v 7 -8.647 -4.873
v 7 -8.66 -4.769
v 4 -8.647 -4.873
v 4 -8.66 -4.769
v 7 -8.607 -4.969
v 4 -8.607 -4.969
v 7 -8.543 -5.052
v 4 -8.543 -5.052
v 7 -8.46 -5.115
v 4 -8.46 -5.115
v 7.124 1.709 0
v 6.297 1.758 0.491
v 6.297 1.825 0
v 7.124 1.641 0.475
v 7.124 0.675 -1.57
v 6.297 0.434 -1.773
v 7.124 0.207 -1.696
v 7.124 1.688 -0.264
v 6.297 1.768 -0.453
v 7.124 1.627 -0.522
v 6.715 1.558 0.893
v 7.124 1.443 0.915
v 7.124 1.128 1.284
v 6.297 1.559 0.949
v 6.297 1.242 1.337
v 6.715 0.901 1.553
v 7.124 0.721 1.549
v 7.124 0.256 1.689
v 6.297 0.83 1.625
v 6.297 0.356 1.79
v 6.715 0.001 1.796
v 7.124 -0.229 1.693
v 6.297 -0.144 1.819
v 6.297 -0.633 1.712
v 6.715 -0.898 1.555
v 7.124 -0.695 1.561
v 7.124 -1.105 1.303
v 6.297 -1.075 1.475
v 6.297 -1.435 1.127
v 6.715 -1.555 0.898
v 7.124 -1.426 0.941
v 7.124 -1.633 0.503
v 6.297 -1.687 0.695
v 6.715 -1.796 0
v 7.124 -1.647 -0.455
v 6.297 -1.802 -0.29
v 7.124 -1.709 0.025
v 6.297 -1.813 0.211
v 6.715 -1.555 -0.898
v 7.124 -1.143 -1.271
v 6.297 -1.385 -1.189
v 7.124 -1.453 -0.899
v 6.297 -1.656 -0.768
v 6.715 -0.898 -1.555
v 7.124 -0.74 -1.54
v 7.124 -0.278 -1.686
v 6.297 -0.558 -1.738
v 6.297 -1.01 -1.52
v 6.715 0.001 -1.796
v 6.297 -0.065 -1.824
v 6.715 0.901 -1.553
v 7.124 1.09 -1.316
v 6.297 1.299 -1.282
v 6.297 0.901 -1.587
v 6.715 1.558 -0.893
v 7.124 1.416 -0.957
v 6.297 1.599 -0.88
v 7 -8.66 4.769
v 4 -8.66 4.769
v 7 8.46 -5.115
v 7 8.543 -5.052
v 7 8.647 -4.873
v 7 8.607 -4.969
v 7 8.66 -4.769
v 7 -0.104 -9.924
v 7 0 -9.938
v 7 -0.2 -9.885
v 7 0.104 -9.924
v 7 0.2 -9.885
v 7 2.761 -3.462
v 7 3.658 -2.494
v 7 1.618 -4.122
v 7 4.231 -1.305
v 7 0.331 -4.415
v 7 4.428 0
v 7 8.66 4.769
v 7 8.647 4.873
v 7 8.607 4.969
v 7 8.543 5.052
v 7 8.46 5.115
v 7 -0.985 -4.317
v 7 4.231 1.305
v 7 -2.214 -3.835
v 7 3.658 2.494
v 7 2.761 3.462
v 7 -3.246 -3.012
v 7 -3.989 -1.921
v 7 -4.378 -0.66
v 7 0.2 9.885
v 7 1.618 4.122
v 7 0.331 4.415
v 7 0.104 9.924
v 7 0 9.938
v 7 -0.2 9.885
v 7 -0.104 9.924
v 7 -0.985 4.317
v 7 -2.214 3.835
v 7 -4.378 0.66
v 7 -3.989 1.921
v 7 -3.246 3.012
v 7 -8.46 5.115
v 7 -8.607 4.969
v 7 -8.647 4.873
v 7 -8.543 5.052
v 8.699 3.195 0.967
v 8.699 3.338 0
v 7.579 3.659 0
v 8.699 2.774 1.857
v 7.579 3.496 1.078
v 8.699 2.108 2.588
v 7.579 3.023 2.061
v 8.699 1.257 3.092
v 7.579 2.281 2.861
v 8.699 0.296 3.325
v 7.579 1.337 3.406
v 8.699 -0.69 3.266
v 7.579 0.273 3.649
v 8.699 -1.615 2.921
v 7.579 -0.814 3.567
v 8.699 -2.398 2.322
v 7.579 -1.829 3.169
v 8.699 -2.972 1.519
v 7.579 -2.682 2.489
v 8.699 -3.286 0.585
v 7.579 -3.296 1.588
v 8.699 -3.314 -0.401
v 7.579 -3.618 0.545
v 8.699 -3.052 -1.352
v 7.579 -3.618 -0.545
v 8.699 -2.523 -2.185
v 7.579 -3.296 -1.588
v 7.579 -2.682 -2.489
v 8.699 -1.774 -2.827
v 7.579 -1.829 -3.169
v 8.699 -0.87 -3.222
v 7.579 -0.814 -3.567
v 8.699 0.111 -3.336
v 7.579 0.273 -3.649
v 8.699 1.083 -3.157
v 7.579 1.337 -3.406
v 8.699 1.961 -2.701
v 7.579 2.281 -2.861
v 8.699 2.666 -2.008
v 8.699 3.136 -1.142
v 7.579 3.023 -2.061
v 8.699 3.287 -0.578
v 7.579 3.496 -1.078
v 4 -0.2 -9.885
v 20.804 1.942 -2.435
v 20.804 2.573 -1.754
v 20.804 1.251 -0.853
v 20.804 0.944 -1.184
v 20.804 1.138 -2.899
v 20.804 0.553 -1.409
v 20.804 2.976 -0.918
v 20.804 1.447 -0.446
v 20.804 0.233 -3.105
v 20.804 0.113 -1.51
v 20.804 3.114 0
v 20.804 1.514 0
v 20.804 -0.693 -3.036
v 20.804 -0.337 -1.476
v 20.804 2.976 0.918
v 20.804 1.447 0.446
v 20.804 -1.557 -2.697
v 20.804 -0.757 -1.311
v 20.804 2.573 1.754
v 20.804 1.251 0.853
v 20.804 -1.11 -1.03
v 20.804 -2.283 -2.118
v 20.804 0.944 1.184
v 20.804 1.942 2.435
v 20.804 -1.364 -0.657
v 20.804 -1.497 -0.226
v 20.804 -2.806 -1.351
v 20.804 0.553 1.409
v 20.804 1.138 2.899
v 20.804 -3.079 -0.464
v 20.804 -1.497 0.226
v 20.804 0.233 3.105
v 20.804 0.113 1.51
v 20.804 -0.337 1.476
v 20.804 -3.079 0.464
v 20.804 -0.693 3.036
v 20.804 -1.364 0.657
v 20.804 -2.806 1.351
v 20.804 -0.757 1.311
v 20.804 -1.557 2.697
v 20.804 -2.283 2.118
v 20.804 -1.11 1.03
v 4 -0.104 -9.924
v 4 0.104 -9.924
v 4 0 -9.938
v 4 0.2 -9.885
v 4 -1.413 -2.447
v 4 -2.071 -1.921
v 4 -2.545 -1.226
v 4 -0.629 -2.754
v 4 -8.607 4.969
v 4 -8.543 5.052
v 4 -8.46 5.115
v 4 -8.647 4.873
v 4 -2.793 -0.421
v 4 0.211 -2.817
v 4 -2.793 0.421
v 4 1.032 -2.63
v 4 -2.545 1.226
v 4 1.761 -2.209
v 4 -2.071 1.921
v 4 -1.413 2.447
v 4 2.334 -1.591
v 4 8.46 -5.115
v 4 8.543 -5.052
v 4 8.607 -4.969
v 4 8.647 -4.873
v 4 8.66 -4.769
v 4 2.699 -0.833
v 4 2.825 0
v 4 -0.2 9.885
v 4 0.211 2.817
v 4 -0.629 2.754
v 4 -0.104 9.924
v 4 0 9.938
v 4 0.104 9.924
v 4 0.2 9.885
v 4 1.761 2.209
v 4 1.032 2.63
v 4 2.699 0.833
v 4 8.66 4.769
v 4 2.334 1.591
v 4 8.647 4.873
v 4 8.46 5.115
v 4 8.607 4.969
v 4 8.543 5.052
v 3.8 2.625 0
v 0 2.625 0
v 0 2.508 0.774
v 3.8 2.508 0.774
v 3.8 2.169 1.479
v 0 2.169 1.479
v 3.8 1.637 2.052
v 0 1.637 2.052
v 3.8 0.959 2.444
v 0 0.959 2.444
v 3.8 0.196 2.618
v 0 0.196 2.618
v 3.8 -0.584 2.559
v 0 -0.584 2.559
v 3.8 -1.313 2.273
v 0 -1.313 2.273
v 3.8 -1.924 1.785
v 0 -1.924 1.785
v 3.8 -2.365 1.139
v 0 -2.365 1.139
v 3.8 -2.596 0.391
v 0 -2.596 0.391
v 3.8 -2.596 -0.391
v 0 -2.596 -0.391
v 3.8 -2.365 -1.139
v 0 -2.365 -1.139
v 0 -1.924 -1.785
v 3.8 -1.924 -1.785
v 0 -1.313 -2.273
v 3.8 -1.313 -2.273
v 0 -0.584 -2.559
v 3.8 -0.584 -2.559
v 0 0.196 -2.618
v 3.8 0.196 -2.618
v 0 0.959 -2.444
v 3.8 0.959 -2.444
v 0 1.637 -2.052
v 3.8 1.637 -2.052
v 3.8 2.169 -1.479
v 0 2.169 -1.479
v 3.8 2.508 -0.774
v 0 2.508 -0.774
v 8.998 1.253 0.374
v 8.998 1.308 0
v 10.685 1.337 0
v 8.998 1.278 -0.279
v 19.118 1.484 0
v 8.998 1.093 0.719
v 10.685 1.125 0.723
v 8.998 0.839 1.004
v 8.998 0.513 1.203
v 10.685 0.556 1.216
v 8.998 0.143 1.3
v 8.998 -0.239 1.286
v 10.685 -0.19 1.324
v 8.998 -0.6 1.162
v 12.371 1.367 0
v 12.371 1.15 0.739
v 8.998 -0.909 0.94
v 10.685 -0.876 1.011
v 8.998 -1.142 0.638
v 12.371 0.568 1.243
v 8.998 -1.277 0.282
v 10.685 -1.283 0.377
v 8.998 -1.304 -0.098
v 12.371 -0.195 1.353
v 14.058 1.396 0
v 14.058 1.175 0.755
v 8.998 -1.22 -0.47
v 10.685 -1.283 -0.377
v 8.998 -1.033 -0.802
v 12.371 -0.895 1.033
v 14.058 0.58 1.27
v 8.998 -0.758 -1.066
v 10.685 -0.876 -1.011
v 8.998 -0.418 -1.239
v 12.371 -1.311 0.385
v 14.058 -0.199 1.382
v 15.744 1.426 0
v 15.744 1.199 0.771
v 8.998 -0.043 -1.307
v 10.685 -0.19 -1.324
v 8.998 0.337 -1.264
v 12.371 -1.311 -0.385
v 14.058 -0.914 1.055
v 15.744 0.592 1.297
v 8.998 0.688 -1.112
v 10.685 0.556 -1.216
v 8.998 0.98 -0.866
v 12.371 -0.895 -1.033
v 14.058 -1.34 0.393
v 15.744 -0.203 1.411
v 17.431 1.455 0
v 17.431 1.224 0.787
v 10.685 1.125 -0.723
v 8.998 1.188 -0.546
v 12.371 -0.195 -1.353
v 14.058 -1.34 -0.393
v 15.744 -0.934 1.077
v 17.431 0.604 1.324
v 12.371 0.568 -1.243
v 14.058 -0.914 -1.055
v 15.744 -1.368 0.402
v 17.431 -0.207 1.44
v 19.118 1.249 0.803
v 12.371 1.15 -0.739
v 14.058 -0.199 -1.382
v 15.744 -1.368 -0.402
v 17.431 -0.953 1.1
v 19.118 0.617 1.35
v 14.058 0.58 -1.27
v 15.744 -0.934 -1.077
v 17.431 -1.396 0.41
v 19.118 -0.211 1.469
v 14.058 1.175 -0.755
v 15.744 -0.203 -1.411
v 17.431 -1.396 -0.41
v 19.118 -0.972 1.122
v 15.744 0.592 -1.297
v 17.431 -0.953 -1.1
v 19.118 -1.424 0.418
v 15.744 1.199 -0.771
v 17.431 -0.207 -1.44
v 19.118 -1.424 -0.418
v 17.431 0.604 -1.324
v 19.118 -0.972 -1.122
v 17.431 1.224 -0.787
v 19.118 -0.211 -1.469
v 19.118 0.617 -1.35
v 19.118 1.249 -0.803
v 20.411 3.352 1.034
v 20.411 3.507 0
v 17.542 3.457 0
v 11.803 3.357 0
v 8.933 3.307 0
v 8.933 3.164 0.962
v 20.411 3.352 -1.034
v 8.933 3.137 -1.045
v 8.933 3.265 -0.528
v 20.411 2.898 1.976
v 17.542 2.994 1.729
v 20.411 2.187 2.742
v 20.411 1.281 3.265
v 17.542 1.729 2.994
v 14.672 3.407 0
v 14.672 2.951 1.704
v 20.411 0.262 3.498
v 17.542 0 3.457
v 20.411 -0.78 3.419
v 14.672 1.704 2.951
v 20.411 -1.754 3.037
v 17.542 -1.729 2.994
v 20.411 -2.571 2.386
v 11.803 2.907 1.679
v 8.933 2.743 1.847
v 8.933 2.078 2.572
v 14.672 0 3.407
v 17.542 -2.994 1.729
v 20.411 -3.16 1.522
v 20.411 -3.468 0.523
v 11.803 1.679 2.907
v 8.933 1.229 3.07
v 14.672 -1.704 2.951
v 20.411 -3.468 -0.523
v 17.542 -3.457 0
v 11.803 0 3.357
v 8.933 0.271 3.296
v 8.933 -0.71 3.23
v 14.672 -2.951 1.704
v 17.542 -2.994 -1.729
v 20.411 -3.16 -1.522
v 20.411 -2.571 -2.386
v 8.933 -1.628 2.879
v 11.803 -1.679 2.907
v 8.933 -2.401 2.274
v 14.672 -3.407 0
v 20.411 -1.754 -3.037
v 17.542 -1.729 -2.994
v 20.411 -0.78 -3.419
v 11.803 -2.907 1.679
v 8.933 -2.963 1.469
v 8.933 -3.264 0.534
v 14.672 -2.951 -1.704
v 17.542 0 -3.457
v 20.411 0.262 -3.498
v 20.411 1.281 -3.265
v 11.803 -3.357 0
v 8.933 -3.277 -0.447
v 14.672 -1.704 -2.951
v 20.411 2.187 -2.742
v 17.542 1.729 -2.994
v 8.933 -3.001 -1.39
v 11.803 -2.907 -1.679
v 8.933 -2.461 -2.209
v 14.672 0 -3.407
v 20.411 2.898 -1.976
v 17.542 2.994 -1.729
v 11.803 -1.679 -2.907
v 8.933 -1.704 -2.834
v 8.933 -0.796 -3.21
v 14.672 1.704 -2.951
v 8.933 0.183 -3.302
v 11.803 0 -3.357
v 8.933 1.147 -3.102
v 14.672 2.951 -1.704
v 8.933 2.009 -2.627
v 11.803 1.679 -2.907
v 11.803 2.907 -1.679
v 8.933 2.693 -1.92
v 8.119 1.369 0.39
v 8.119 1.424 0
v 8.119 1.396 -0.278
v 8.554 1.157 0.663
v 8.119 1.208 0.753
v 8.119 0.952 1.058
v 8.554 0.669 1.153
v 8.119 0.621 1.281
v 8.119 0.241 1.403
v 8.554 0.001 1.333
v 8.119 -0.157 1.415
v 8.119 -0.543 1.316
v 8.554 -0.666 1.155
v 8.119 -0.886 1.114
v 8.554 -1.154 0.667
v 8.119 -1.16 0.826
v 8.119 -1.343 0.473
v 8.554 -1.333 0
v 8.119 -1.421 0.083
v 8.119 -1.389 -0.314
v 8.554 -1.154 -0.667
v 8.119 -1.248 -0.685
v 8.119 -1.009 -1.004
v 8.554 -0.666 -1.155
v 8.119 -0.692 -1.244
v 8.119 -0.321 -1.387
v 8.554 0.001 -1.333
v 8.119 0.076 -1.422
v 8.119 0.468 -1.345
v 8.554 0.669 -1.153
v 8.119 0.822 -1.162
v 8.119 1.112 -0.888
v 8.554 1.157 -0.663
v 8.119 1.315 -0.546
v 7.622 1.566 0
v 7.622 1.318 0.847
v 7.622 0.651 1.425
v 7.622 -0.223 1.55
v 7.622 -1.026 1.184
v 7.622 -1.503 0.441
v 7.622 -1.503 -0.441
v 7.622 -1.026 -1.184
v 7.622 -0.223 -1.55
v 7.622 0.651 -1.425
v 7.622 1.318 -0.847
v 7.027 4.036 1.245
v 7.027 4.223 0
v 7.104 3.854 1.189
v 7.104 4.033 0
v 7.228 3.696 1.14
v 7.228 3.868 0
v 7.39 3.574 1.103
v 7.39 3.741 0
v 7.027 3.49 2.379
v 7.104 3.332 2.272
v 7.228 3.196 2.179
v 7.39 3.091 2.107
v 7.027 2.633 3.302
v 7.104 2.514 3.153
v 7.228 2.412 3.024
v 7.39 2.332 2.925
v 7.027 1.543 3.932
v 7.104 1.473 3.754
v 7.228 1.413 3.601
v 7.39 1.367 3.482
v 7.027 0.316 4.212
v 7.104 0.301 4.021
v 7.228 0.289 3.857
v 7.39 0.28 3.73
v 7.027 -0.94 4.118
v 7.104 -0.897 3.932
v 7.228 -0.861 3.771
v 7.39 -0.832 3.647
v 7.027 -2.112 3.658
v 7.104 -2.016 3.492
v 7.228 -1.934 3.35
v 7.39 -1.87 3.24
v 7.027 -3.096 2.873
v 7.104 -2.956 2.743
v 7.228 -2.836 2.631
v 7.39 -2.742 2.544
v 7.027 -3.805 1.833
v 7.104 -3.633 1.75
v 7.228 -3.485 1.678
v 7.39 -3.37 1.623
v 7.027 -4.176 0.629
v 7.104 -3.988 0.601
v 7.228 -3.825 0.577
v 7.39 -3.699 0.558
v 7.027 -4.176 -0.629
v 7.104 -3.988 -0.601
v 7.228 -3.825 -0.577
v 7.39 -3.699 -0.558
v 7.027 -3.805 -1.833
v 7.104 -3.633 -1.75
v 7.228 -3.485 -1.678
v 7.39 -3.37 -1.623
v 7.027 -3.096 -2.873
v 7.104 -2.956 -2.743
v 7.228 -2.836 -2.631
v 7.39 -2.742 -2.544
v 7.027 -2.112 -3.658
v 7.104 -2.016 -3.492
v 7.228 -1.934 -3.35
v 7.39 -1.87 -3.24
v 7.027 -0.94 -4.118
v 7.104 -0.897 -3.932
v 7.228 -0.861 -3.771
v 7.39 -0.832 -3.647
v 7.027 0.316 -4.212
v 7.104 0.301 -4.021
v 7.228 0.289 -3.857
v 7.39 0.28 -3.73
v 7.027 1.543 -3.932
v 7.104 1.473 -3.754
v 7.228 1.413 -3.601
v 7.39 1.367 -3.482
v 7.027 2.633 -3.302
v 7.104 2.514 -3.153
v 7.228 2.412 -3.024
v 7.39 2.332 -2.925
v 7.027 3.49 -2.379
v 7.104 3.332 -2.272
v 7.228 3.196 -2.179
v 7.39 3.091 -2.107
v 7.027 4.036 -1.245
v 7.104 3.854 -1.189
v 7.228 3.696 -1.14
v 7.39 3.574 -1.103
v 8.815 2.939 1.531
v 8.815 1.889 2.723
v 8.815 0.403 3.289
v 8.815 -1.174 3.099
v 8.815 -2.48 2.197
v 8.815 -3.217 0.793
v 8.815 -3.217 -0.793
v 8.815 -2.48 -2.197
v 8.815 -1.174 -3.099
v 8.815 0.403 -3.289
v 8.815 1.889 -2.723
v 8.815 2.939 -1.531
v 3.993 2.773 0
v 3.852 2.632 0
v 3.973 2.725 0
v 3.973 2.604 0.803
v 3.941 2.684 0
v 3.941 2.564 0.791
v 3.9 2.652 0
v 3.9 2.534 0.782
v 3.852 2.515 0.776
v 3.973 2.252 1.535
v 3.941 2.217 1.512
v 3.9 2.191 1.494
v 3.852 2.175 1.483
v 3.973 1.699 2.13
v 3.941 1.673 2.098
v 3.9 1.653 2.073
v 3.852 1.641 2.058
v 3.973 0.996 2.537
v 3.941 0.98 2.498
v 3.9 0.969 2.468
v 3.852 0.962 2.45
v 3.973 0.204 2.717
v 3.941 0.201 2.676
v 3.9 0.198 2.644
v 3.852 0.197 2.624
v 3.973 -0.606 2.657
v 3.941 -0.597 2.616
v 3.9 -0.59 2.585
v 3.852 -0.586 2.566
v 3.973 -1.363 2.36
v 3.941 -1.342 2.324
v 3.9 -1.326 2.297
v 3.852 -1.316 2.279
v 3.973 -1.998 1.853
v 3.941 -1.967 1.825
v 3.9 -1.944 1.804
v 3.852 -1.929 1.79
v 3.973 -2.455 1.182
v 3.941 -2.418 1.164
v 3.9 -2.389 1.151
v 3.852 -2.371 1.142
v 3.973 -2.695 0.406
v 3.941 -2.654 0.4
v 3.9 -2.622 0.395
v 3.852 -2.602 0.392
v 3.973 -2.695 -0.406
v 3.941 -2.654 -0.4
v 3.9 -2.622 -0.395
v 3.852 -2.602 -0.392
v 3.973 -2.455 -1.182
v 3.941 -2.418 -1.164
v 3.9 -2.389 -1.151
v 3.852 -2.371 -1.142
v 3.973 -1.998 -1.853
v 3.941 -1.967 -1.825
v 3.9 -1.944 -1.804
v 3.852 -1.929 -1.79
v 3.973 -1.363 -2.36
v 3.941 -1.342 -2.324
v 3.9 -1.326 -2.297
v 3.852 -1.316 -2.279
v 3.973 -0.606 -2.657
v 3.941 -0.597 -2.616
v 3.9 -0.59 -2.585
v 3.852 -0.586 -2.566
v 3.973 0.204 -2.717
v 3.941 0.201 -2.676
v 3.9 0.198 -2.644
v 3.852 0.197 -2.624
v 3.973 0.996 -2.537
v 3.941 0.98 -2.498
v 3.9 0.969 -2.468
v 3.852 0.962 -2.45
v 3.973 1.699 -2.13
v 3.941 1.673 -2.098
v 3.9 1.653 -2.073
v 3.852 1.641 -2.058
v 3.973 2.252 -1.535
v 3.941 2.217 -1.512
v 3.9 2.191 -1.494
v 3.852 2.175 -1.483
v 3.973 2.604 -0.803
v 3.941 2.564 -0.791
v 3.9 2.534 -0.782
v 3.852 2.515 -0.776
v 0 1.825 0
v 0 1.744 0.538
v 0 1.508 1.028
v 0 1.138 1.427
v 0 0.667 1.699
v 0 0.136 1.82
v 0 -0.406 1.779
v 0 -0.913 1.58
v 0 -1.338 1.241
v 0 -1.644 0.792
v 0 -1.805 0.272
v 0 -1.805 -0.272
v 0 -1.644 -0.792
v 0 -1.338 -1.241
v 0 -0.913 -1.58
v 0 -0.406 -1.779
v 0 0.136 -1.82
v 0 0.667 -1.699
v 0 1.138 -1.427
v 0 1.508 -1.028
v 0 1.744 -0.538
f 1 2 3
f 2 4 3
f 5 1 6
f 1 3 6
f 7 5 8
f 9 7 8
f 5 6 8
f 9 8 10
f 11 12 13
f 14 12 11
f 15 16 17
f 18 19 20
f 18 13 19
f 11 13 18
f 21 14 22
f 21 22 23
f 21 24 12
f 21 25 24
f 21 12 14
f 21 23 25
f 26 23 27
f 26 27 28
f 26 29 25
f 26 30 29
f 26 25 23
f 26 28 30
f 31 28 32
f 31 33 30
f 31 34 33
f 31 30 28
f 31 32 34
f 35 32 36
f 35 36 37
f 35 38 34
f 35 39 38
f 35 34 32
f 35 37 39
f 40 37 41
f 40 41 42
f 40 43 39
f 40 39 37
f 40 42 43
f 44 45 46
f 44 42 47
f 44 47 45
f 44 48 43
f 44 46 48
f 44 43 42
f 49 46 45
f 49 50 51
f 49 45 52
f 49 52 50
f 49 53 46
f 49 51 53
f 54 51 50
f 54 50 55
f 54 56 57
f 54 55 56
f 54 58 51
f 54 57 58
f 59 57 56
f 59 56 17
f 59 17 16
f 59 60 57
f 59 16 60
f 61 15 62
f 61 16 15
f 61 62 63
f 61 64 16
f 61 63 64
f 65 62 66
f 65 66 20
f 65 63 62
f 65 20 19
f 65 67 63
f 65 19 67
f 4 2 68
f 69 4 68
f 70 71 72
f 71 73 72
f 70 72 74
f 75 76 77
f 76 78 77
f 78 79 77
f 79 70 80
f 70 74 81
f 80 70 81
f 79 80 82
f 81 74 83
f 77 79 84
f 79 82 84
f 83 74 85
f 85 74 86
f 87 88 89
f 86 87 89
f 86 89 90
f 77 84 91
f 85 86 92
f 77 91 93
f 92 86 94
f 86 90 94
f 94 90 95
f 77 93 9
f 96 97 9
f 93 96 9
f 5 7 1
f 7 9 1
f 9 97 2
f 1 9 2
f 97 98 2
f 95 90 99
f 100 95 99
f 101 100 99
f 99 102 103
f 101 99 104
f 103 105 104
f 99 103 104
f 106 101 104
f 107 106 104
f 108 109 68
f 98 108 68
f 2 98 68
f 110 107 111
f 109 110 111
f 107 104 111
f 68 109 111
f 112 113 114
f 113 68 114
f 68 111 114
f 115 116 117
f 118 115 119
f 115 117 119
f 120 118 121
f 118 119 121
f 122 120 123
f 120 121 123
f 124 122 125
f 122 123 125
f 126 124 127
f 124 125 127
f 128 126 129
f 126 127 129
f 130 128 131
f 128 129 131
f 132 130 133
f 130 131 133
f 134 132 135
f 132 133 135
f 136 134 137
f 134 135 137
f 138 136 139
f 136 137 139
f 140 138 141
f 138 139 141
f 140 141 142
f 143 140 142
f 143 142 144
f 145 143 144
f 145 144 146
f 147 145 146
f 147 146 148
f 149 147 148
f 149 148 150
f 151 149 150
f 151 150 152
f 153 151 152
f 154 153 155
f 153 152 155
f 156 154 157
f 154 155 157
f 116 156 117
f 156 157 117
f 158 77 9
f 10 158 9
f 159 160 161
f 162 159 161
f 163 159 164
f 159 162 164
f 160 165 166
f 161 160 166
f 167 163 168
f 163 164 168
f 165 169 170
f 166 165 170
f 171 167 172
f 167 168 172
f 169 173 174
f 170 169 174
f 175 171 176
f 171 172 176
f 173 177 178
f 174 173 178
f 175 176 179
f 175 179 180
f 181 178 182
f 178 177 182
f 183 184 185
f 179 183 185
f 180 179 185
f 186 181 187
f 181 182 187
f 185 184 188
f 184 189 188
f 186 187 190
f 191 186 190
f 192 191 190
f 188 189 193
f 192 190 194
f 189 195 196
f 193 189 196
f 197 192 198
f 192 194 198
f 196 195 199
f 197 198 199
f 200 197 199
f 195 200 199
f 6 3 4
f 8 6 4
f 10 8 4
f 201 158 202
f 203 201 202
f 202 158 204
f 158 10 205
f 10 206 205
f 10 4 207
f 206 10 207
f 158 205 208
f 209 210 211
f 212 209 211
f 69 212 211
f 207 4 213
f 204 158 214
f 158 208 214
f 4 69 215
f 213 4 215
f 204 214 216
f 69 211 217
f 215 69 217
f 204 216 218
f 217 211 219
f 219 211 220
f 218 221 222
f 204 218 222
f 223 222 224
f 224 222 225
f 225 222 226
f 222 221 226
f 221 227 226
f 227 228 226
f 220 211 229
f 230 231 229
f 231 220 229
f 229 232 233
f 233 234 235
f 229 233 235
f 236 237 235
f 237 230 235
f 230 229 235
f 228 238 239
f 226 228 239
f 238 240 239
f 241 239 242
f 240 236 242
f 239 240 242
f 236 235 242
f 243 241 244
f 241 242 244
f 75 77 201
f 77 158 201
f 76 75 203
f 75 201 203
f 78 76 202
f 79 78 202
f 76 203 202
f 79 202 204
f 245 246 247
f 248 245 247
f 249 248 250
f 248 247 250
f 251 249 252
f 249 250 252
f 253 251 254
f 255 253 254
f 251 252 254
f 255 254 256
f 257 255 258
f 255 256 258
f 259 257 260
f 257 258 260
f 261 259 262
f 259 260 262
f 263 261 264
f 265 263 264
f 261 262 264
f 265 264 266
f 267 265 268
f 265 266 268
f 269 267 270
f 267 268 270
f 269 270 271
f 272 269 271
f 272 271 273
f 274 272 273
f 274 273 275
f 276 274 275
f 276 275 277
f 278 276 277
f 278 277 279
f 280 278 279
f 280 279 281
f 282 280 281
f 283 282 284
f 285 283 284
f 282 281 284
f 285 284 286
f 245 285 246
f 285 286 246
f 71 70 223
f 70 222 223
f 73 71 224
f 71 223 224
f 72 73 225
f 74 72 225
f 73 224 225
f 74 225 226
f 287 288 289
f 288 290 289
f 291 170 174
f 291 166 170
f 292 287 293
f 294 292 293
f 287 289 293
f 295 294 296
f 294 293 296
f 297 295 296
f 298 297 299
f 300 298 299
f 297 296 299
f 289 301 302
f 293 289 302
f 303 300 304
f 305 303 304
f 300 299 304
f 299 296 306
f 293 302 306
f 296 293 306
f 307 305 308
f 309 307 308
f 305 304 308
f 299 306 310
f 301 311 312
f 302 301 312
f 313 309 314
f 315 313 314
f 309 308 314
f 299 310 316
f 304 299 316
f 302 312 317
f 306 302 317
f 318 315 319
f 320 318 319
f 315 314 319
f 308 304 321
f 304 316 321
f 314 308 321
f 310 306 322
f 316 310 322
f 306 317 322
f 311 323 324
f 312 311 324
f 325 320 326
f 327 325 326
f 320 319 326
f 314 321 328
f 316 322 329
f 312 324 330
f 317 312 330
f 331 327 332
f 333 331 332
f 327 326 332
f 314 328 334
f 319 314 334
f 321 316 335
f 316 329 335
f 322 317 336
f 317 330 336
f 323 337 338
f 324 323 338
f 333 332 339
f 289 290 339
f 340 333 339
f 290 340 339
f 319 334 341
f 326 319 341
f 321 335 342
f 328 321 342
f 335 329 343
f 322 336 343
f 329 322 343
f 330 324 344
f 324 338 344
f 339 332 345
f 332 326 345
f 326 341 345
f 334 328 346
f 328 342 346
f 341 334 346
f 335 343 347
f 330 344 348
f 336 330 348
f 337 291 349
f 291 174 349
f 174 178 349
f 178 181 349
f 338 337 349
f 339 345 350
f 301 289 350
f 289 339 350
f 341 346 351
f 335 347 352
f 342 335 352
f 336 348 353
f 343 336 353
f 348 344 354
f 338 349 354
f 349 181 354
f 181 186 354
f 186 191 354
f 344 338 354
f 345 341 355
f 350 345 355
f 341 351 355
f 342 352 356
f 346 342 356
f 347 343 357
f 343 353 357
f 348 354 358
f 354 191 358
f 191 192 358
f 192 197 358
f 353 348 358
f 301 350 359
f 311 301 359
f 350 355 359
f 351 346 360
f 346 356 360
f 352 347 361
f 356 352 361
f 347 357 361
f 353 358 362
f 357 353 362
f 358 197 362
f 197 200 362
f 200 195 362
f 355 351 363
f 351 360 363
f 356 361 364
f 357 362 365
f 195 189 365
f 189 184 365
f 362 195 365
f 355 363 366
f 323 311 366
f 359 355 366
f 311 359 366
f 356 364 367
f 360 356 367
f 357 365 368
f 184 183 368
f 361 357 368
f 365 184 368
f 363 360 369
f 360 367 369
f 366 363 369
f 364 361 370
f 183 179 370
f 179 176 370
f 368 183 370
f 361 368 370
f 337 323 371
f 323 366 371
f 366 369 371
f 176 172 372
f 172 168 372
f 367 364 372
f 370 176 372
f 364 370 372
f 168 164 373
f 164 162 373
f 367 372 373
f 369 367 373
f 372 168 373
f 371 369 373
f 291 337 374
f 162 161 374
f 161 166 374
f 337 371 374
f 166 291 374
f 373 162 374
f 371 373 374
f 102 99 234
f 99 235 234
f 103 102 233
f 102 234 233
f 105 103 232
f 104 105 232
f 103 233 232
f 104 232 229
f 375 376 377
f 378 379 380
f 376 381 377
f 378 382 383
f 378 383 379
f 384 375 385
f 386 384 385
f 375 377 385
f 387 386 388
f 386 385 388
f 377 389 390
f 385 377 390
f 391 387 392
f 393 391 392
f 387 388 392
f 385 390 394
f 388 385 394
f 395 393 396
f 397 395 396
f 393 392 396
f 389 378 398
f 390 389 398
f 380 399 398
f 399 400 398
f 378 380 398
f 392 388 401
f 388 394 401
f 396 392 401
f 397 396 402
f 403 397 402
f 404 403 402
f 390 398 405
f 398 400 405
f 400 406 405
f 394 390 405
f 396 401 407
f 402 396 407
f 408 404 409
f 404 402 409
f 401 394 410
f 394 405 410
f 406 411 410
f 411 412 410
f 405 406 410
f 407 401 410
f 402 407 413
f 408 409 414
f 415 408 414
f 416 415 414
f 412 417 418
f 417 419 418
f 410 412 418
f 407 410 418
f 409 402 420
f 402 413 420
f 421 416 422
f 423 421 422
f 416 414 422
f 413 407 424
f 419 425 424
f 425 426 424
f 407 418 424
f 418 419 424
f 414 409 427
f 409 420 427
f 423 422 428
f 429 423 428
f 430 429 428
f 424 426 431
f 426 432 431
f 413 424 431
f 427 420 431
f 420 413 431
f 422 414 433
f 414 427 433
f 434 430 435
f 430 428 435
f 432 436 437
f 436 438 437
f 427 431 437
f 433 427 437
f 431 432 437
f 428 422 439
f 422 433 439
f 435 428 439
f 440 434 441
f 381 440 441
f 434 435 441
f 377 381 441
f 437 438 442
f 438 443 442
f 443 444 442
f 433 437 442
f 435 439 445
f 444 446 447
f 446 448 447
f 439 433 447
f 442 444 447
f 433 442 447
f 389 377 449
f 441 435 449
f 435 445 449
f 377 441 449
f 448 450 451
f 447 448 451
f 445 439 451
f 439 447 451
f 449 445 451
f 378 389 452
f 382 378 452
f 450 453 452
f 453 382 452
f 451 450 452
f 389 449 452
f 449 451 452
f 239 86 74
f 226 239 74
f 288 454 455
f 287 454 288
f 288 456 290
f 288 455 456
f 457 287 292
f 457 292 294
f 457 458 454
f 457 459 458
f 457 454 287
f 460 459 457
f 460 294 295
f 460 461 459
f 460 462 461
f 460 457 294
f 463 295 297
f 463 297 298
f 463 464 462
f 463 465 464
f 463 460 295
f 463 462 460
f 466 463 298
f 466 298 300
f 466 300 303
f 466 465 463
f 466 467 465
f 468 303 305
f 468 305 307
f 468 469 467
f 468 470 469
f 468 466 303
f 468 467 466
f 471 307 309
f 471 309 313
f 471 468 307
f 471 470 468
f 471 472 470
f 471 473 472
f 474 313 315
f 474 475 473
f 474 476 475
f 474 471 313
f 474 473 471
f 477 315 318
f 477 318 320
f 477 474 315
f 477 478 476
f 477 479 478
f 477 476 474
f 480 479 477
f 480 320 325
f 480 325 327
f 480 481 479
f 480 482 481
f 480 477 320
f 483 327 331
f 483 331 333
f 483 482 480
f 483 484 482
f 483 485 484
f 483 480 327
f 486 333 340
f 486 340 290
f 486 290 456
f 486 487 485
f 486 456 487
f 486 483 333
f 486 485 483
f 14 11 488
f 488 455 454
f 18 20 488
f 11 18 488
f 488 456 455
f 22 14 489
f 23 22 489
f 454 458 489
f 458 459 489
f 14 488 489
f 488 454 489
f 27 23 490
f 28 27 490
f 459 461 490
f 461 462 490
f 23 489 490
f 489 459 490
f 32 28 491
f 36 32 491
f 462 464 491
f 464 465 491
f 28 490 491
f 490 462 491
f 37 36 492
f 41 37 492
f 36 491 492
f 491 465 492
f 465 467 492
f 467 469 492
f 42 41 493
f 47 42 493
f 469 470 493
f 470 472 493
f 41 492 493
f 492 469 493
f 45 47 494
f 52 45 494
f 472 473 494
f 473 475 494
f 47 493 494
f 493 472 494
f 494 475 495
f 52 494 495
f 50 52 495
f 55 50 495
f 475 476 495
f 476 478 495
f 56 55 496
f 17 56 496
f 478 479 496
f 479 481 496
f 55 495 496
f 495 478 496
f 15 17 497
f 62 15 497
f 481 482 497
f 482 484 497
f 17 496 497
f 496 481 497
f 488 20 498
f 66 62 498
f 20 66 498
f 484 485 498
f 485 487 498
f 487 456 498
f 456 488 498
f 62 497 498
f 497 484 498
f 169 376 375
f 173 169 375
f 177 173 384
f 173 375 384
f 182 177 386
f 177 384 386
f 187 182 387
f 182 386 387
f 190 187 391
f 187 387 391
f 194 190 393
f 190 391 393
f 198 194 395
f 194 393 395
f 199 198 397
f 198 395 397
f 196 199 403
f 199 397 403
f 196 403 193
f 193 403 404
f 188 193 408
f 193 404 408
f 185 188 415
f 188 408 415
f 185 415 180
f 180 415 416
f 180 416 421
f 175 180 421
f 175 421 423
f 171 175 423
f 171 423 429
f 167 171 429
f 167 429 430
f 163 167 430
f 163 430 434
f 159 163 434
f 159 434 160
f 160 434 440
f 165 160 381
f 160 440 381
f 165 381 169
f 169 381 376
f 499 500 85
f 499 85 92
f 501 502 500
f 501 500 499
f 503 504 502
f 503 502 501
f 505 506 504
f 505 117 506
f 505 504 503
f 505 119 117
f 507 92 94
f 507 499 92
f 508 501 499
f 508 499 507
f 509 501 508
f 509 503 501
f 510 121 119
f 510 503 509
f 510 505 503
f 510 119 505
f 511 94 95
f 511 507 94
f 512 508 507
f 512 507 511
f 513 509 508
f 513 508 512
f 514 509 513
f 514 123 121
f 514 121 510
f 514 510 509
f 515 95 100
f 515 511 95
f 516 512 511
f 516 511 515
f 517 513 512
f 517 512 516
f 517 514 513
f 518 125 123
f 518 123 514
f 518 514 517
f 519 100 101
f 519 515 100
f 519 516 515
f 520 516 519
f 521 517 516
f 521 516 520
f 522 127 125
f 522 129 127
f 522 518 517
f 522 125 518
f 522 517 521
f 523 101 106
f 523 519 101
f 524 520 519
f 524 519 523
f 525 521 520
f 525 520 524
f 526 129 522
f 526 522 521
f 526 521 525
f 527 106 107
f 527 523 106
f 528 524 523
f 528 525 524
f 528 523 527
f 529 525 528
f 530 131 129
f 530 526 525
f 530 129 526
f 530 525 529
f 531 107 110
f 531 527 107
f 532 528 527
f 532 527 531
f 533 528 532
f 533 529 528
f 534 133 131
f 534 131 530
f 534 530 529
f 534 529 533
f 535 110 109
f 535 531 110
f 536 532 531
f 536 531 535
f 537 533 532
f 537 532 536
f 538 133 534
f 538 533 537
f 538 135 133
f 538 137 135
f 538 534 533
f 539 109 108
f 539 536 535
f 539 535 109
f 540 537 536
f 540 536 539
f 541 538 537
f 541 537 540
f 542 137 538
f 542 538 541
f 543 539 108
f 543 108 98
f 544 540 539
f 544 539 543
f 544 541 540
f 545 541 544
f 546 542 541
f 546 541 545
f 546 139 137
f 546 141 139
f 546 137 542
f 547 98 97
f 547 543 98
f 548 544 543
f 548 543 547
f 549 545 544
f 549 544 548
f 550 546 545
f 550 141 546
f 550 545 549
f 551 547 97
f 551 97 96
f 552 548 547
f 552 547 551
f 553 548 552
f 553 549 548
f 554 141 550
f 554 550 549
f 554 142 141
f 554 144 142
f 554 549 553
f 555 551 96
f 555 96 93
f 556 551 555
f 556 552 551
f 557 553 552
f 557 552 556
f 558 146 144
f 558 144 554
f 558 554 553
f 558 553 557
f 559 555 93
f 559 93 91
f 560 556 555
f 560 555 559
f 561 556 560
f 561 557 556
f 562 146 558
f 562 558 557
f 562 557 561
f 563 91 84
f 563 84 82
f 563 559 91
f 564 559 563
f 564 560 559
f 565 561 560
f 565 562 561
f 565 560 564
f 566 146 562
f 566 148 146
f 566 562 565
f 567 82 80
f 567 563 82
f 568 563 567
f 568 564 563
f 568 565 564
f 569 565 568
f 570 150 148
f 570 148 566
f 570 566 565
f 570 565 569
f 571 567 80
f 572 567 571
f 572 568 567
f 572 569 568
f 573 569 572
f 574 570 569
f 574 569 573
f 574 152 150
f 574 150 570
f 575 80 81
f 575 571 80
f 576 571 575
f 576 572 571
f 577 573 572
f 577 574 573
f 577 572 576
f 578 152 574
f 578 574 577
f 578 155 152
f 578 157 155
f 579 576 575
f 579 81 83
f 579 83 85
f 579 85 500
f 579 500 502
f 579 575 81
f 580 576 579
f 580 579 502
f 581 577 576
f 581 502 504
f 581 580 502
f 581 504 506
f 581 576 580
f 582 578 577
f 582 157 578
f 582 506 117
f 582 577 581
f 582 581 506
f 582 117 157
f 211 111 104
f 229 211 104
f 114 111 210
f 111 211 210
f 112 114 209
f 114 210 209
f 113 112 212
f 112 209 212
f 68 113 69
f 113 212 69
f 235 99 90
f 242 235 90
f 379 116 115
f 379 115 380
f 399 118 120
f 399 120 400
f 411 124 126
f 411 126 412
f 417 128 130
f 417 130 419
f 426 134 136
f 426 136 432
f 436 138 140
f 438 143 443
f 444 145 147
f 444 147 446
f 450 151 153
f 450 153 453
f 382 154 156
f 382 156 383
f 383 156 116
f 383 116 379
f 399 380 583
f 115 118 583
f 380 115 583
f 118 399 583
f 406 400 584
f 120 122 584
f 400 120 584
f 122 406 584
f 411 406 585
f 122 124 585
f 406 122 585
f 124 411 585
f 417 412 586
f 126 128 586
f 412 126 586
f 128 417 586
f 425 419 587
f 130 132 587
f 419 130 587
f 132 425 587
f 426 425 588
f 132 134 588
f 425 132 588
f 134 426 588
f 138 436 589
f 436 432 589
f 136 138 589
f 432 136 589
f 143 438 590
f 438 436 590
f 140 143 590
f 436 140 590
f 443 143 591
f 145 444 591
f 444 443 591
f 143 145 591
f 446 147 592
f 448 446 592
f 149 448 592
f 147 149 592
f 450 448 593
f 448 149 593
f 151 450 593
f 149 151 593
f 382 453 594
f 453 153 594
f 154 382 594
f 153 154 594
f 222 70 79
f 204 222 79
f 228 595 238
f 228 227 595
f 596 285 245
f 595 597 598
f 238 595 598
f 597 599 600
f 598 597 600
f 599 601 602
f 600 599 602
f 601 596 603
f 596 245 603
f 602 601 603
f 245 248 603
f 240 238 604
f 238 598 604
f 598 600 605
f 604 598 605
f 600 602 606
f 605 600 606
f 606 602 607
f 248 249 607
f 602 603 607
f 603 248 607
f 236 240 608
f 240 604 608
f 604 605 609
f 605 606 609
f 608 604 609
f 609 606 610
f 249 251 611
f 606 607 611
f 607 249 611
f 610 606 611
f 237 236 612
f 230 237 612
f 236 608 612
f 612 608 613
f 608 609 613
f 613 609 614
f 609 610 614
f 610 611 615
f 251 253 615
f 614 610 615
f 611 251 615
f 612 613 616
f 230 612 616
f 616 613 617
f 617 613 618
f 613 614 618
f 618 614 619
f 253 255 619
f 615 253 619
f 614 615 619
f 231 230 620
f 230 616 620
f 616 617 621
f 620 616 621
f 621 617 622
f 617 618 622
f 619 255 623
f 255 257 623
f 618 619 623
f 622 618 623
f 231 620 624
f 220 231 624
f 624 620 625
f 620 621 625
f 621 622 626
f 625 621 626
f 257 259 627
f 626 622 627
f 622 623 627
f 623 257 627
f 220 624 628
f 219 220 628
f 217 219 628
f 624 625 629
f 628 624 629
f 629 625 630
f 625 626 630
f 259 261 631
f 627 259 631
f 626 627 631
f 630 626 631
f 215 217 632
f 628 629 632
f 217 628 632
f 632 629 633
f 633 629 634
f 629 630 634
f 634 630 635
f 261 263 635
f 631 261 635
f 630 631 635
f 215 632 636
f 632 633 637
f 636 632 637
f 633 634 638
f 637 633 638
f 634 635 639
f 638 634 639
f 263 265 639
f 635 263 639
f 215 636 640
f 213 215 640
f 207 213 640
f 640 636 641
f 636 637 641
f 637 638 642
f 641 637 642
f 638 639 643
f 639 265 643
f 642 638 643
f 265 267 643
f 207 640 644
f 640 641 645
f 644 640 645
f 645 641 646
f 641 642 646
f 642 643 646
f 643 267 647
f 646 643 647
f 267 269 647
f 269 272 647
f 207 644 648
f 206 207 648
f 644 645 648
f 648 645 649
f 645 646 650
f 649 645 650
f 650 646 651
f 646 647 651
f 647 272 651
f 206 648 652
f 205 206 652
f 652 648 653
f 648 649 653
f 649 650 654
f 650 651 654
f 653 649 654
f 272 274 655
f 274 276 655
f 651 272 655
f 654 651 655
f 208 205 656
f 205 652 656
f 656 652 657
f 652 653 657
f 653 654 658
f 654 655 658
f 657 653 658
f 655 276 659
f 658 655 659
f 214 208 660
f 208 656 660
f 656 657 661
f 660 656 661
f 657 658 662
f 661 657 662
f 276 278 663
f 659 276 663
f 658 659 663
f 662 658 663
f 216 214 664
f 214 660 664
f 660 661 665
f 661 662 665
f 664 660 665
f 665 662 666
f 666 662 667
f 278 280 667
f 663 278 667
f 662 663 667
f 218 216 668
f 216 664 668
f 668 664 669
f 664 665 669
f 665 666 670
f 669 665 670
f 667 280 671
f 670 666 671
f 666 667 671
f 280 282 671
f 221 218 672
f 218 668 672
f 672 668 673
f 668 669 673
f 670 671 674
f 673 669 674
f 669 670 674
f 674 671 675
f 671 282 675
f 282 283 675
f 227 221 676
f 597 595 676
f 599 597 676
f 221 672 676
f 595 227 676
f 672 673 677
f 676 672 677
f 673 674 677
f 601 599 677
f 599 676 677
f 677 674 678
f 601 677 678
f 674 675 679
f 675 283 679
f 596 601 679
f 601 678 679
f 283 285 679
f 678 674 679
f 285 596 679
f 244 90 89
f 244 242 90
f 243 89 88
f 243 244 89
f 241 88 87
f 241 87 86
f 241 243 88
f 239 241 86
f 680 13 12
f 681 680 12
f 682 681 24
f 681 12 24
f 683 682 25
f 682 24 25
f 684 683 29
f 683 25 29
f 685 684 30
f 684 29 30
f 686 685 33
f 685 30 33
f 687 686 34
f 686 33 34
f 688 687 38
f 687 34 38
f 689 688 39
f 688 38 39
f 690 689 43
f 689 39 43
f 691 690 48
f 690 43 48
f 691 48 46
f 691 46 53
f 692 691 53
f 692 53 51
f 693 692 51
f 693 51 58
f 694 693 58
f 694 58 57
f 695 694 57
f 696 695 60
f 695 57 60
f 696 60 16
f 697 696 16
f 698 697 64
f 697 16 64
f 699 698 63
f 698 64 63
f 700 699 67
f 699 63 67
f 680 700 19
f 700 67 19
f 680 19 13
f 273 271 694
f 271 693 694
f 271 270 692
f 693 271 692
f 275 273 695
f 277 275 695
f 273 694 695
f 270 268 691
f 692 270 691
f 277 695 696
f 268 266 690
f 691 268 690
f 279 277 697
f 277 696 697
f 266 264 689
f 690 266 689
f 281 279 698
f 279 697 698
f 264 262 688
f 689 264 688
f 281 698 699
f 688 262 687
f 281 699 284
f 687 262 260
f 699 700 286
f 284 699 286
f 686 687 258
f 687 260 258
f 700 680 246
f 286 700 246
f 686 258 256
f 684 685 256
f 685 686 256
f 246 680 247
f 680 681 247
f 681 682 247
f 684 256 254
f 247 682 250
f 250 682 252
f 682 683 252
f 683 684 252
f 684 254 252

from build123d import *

# Parameters (mm, degrees)
FILLET4_R               = 3
CHAMFER1_SIZE2          = 0.393197641
CHAMFER1_SIZE           = 0.4
CUT_EXTRUDE1_DEPTH      = 14.804133806
CUT_EXTRUDE1_DEPTH_BACK = 8.0000001
FILLET5_R               = 0.4
FILLET6_R               = 0.8
FILLET7_R               = 0.2


with BuildPart() as part:
    # Sketch1 → Revolve1 (revolve)
    with BuildSketch(Plane.XY):
        Polygon((0, 1.825), (6.718918331, 1.825), (8.549810914, 1.3), (20.804133706, 1.5139), (20.804133706, 3.514204656), (8.813762579, 3.30491195), (7, 3.825), (7, 10), (4, 10), (4, 2.625), (0, 2.625), align=None)
    revolve(axis=Axis((0, 0, 0), (1, 0, 0)))

    # Fillet4
    fillet4_edges = [part.edges().sort_by_distance(p)[0] for p in [
        (8.549810914, -1.3, 0),
        (6.718918331, -1.825, 0),
    ]]
    fillet(fillet4_edges, radius=FILLET4_R)

    # Chamfer1
    chamfer1_edges = [part.edges().sort_by_distance(p)[0] for p in [
        (20.804133706, -3.514204656, 0),
    ]]
    chamfer(chamfer1_edges, length=CHAMFER1_SIZE, length2=CHAMFER1_SIZE2)

    # Sketch2 → Cut-Extrude1 (cut, two sides)
    with BuildSketch(Plane(origin=(7, 0, 0), x_dir=(0, 0, -1), z_dir=(1, 0, 0))) as cut_extrude1_sk:
        with BuildLine():
            Line((-10, 0), (-5, 8.660254038))
            ThreePointArc((-5, 8.660254038), (-8.660254038, 5), (-10, 0))
        make_face()
        with BuildLine():
            Line((-5, 8.660254038), (5, 8.660254038))
            ThreePointArc((5, 8.660254038), (0, 10), (-5, 8.660254038))
        make_face()
        with BuildLine():
            Line((5, 8.660254038), (10, 0))
            ThreePointArc((10, 0), (8.660254038, 5), (5, 8.660254038))
        make_face()
        with BuildLine():
            ThreePointArc((-10, 0), (-8.660254038, -5), (-5, -8.660254038))
            Line((-5, -8.660254038), (-10, 0))
        make_face()
        with BuildLine():
            ThreePointArc((-5, -8.660254038), (0, -10), (5, -8.660254038))
            Line((5, -8.660254038), (-5, -8.660254038))
        make_face()
        with BuildLine():
            ThreePointArc((5, -8.660254038), (8.660254038, -5), (10, 0))
            Line((10, 0), (5, -8.660254038))
        make_face()
    extrude(amount=CUT_EXTRUDE1_DEPTH, mode=Mode.SUBTRACT)
    extrude(cut_extrude1_sk.sketch, amount=-CUT_EXTRUDE1_DEPTH_BACK, mode=Mode.SUBTRACT)

    # Fillet5
    fillet5_edges = [part.edges().sort_by_distance(p)[0] for p in [
        (5.5, 8.660254038, 5),
        (5.5, 0, 10),
        (5.5, 0, -10),
        (5.5, 8.660254038, -5),
        (5.5, -8.660254038, 5),
        (5.5, -8.660254038, -5),
    ]]
    fillet(fillet5_edges, radius=FILLET5_R)

    # Fillet6
    fillet6_edges = [part.edges().sort_by_distance(p)[0] for p in [
        (7, -3.825, 0),
        (8.813762579, -3.30491195, 0),
    ]]
    fillet(fillet6_edges, radius=FILLET6_R)

    # Fillet7
    fillet7_edges = [part.edges().sort_by_distance(p)[0] for p in [
        (4, -2.625, 0),
    ]]
    fillet(fillet7_edges, radius=FILLET7_R)


solid = part.part
